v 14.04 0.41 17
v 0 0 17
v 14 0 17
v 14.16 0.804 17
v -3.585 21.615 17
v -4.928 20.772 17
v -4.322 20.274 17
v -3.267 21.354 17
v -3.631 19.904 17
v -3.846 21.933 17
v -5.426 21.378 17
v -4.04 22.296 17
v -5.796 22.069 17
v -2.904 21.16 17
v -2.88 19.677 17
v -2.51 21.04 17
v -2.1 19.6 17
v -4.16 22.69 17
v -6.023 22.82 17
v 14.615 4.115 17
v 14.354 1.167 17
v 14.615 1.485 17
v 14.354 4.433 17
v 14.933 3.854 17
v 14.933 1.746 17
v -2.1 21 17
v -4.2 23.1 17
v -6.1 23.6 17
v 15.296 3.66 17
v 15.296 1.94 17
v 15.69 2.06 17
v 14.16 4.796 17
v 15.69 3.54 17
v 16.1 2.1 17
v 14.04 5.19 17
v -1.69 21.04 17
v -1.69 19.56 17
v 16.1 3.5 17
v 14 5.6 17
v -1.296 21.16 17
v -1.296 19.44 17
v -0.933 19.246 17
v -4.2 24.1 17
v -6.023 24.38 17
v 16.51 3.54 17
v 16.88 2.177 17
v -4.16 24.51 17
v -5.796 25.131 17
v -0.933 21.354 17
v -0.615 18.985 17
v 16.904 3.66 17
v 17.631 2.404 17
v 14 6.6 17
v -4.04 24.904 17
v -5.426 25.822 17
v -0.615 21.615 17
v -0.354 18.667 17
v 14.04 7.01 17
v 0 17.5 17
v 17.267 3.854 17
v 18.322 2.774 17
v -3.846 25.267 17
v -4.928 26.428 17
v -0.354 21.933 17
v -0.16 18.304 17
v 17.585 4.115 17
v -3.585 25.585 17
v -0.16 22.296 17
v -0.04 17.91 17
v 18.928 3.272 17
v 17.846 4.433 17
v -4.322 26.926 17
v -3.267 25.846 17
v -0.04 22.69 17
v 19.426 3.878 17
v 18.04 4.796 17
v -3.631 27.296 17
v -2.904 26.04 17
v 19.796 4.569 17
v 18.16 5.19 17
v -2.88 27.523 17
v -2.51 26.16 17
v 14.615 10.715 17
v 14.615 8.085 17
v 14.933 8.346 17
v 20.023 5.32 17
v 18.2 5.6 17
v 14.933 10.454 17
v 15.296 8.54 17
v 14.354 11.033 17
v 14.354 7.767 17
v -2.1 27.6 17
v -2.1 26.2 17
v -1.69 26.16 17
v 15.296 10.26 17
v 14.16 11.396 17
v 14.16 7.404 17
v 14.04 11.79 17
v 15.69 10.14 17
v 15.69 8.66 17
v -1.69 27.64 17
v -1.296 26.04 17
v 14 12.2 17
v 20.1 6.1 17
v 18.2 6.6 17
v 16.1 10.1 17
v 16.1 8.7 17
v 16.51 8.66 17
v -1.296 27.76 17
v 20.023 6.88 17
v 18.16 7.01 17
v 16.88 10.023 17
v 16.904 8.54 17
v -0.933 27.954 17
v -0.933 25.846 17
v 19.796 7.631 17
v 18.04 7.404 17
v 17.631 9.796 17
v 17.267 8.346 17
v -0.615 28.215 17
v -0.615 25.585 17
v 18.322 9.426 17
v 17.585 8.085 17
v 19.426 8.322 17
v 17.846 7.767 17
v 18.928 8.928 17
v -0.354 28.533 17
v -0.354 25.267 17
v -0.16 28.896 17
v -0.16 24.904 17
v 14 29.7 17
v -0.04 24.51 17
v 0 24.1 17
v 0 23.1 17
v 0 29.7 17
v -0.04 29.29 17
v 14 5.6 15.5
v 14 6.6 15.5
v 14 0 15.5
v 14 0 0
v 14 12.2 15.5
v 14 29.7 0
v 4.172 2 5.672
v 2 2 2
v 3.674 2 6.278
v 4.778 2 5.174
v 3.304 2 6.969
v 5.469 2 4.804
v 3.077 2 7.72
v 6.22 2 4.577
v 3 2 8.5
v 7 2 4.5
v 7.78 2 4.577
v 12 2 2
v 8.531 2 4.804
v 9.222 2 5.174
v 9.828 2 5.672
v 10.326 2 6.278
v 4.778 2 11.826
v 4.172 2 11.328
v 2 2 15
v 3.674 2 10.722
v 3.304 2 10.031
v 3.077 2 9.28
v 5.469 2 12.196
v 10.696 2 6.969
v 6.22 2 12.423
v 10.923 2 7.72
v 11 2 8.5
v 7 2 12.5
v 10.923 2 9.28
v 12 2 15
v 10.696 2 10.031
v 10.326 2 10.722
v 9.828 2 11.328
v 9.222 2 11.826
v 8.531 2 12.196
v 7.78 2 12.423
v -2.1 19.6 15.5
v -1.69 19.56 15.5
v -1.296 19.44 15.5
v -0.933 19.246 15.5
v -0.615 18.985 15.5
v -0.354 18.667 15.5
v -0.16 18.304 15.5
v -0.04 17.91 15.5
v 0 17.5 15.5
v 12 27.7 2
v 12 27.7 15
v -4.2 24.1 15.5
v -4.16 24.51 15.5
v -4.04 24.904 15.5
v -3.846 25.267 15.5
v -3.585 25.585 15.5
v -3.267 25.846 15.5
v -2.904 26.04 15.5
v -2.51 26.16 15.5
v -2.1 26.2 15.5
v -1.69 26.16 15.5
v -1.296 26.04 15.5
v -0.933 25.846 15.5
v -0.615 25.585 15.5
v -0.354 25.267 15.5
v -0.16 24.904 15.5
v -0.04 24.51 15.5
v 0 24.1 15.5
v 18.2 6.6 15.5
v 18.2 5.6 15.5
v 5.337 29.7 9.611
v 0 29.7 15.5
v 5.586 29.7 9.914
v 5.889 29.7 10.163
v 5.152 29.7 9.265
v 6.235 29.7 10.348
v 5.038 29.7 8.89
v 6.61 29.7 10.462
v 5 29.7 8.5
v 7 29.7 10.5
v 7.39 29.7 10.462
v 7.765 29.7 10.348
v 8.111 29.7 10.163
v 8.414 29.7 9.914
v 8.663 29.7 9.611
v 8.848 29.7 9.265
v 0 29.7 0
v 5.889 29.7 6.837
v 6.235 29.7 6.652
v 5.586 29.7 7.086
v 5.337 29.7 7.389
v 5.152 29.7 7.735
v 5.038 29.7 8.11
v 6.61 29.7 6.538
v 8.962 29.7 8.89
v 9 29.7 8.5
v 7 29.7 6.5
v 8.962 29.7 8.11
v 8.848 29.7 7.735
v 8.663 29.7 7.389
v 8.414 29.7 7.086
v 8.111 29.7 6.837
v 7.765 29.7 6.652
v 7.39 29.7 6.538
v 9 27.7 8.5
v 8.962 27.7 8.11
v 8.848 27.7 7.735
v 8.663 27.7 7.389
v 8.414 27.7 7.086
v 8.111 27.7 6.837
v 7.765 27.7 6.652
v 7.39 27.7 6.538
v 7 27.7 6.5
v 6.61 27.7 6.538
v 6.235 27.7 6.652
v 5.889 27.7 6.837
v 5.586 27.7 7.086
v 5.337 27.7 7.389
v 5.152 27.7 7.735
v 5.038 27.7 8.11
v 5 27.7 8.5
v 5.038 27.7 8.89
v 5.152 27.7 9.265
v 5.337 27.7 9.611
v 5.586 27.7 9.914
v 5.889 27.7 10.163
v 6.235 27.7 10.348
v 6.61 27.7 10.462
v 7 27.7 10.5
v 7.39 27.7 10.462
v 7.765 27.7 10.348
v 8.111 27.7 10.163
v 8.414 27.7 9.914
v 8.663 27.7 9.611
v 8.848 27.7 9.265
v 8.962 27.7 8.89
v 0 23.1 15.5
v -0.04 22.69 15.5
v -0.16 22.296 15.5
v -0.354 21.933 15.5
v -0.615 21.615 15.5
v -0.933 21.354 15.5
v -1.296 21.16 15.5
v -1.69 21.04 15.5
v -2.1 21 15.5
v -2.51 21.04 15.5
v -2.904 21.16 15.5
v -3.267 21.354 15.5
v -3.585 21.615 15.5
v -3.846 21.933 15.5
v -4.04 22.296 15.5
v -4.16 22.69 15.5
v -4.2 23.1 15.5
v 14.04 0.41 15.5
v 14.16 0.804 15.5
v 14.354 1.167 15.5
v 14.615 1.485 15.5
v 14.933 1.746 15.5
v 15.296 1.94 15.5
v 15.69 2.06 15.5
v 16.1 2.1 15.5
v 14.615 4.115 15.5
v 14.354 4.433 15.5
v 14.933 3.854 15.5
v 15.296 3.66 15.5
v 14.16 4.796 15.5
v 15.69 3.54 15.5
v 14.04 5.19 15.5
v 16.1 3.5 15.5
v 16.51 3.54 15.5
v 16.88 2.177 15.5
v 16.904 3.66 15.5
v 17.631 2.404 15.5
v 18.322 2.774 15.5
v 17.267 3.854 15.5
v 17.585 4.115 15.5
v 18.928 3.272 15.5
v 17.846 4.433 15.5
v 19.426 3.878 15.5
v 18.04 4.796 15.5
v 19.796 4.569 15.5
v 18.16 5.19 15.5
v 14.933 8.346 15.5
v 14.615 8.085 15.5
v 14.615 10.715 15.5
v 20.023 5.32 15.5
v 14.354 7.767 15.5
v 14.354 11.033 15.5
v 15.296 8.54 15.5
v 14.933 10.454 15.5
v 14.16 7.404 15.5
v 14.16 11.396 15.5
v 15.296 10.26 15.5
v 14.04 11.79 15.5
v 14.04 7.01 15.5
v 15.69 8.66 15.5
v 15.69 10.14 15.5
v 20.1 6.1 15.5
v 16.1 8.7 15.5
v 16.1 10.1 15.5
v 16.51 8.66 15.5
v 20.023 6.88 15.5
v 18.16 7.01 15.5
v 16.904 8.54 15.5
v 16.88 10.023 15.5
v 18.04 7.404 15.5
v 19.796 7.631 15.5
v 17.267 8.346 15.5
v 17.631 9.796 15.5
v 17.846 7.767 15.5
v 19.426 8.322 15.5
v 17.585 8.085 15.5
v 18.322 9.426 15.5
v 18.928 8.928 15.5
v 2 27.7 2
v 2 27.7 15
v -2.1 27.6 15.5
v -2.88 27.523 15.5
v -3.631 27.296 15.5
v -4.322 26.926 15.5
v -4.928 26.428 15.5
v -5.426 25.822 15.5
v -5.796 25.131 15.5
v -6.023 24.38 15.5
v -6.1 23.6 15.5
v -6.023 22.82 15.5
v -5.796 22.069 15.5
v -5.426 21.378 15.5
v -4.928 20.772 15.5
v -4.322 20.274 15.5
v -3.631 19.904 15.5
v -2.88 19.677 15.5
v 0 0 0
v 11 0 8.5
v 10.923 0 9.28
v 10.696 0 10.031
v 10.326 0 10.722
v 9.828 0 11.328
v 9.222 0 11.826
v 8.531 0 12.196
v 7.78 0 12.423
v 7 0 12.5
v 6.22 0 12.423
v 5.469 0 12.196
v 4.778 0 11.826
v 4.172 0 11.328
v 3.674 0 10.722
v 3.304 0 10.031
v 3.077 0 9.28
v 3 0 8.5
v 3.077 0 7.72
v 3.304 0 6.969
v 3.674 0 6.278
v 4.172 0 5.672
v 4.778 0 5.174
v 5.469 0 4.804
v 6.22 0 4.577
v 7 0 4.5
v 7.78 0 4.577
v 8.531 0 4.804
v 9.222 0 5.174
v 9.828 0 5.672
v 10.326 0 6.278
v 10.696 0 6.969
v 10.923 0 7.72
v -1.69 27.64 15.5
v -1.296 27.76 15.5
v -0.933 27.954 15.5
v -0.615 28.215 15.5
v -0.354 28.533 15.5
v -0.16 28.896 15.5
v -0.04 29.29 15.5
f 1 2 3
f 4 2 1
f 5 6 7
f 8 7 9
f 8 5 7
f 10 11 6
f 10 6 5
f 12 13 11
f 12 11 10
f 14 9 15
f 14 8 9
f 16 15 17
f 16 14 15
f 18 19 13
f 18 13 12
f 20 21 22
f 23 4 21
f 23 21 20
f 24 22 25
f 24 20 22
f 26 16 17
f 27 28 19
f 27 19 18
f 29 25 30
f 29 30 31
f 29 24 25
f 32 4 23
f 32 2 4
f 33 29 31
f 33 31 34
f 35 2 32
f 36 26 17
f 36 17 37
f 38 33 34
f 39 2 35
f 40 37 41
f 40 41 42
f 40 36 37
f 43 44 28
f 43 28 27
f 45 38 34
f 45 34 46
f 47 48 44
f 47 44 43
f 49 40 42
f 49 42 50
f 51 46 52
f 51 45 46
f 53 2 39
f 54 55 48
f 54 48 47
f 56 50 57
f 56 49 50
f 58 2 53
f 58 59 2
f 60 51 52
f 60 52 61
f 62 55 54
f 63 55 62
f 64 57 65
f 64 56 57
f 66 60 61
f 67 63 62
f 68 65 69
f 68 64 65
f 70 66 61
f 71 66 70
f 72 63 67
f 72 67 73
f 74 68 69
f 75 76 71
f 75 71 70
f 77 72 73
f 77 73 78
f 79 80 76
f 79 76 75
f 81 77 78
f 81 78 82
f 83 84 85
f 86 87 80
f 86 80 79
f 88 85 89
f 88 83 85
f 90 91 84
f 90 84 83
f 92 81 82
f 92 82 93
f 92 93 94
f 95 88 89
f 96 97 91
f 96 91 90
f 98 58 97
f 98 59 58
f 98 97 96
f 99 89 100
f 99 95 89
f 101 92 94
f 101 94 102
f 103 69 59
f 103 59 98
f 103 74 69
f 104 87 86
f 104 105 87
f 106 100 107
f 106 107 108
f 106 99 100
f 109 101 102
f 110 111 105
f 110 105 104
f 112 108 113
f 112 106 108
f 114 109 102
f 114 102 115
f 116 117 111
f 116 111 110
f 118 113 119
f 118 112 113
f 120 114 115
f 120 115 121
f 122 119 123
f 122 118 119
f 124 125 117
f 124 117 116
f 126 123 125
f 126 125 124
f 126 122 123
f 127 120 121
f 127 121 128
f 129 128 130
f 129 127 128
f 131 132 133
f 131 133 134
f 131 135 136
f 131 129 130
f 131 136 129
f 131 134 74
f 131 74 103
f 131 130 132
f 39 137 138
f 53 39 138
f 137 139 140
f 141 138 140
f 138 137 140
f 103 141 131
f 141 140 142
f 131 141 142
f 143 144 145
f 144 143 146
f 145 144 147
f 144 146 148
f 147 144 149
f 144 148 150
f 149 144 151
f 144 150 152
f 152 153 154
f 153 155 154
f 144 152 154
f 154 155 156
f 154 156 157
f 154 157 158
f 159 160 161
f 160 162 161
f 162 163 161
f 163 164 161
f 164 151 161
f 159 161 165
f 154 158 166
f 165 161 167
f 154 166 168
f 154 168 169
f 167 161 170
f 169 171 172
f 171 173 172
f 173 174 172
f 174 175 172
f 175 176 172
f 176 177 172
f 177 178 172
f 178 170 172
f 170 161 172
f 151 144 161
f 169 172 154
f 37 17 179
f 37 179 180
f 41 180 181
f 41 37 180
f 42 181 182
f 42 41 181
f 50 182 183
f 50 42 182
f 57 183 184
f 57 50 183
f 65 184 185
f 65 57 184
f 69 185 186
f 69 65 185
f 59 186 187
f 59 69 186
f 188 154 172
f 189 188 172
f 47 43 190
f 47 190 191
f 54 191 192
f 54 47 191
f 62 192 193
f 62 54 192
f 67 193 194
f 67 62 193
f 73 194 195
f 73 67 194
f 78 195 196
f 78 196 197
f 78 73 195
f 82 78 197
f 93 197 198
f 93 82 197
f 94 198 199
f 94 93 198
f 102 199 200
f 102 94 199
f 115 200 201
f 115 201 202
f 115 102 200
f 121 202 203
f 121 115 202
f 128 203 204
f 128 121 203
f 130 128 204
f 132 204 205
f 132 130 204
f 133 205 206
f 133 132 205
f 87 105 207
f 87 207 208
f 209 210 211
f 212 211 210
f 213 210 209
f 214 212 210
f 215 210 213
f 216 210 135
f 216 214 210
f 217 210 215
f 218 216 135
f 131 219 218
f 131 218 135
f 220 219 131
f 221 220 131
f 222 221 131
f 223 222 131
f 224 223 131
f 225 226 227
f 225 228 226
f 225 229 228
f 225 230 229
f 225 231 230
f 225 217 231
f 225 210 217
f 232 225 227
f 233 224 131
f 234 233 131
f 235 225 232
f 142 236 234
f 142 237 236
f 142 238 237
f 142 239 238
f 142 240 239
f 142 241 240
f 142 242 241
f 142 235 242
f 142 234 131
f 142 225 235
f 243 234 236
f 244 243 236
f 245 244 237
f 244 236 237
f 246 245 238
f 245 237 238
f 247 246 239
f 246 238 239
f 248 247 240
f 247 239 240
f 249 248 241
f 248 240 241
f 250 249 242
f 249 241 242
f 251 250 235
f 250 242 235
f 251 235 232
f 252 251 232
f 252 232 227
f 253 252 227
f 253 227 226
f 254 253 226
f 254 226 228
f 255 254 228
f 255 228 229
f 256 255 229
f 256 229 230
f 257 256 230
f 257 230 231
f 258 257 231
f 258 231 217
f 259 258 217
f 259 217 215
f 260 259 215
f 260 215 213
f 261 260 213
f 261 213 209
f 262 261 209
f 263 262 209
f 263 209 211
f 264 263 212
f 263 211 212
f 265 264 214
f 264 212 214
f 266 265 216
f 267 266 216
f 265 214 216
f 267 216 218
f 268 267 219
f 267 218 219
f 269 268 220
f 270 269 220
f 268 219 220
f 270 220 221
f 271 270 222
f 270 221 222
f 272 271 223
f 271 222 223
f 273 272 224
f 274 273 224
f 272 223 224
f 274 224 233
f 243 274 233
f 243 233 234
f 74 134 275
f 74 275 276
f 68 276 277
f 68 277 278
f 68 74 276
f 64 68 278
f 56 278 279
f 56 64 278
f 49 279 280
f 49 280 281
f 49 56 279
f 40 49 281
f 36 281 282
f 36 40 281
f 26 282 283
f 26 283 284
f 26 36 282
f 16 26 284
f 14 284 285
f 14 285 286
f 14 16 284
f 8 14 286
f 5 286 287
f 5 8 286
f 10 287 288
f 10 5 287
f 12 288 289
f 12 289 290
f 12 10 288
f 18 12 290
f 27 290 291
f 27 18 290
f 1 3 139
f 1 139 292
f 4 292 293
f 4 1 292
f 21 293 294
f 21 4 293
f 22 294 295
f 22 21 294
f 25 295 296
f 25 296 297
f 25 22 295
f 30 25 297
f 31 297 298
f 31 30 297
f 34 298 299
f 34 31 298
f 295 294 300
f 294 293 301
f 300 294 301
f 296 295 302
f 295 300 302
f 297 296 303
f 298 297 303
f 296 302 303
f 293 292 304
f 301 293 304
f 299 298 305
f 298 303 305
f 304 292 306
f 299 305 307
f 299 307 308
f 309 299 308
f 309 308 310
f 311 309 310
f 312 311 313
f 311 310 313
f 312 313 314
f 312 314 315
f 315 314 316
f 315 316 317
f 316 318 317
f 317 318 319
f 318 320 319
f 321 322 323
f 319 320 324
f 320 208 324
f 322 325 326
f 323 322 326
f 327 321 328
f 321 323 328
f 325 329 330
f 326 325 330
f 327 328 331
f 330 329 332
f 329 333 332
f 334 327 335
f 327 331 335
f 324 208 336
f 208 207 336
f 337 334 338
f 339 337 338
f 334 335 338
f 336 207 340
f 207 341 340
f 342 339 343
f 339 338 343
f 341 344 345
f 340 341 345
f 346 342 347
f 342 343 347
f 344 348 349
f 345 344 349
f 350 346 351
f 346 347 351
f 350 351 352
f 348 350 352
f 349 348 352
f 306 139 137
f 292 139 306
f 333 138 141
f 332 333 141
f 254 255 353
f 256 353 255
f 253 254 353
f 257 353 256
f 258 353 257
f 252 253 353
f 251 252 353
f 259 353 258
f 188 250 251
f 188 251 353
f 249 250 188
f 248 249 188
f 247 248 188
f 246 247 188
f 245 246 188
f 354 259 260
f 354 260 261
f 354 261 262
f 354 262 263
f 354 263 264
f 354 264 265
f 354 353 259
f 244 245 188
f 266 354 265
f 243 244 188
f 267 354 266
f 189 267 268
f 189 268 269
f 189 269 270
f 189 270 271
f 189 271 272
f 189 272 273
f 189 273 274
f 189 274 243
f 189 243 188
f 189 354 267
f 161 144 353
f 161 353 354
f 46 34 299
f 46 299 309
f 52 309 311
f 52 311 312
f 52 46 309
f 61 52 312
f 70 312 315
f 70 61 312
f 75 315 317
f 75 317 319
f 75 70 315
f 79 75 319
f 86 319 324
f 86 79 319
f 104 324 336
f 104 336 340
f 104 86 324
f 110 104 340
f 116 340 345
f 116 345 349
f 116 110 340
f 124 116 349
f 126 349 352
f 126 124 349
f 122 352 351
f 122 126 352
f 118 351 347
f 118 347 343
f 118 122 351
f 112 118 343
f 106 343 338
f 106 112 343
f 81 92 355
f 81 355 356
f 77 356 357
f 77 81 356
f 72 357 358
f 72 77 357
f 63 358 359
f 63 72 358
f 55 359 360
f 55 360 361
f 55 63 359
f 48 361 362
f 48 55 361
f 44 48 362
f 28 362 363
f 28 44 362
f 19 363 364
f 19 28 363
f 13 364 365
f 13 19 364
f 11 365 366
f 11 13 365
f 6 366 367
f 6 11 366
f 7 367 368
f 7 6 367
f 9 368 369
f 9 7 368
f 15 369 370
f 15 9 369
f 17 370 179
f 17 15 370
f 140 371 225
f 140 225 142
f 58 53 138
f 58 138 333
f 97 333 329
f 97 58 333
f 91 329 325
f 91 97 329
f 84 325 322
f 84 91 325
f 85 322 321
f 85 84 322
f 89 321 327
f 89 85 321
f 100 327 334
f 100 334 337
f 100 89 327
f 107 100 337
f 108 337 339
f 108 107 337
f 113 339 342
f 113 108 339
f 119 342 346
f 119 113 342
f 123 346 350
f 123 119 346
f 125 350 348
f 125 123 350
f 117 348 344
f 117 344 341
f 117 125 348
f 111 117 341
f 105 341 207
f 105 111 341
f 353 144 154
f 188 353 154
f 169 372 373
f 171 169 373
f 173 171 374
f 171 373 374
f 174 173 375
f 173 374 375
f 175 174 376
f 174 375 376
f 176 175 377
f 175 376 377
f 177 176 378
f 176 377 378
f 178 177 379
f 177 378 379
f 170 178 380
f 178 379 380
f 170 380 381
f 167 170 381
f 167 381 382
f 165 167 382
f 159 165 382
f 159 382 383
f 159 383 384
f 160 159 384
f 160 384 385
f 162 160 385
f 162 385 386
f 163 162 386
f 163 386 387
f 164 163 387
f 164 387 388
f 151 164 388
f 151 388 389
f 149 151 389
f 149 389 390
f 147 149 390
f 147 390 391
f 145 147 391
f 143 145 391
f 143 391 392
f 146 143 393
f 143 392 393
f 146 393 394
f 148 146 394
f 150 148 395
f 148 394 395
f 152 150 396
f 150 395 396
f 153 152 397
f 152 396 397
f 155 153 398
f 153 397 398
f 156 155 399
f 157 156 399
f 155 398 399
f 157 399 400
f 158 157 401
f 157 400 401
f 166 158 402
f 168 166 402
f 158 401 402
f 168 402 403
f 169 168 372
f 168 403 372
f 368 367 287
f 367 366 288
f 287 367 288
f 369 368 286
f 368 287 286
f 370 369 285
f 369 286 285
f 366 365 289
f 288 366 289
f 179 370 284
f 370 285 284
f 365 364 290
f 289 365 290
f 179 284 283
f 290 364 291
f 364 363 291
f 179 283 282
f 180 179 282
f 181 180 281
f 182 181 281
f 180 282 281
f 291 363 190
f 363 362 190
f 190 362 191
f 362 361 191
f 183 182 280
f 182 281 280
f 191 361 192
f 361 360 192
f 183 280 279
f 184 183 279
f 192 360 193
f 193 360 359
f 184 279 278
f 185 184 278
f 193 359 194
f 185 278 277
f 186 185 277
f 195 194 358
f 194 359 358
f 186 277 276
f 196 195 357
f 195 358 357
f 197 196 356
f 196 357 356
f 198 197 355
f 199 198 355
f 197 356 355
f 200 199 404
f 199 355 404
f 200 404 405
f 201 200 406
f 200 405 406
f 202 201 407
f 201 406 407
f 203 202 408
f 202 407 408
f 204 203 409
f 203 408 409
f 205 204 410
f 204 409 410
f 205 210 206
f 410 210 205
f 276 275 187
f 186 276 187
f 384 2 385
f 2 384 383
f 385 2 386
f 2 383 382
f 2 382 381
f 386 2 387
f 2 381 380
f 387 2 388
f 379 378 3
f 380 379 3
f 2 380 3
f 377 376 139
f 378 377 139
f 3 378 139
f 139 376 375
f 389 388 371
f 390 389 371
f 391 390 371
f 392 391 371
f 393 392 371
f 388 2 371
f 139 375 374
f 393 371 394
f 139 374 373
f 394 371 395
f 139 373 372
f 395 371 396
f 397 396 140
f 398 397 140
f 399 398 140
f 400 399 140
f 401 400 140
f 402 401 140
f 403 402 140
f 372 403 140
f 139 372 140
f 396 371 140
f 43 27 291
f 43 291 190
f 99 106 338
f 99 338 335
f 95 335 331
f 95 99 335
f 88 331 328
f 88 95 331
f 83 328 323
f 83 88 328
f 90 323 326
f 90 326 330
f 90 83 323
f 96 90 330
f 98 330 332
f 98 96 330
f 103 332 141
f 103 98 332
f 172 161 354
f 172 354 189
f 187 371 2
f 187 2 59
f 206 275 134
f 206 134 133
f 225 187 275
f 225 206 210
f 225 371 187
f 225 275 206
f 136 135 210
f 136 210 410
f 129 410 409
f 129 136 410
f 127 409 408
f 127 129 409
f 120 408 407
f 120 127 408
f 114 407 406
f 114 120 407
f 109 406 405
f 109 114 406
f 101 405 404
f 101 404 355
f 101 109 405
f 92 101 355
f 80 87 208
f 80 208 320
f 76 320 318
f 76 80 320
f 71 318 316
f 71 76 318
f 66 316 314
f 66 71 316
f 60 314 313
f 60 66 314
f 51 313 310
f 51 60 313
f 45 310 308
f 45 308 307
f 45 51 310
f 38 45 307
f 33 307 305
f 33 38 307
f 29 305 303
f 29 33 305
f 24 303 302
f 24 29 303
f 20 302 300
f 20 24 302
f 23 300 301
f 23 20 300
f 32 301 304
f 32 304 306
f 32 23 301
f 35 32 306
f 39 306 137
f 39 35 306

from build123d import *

# Parameters (mm, degrees)
SKETCH1_W           = 14
SKETCH1_H           = 29.7
BOSS_EXTRUDE1_DEPTH = 17
SKETCH2_R           = 2
CUT_EXTRUDE1_DEPTH  = 30.7
SKETCH3_R           = 4
CUT_EXTRUDE2_DEPTH  = 27.7
CUT_EXTRUDE4_START  = -2
SKETCH4_W           = 10
SKETCH4_H           = 13
CUT_EXTRUDE4_DEPTH  = 25.7
BOSS_EXTRUDE2_DEPTH = 1.5


with BuildPart() as part:
    # Sketch1 → Boss-Extrude1 (new body)
    with BuildSketch(Plane.XY):
        with Locations((7, 14.85)):
            Rectangle(SKETCH1_W, SKETCH1_H)
    extrude(amount=BOSS_EXTRUDE1_DEPTH)

    # Sketch2 → Cut-Extrude1 (cut, through all)
    with BuildSketch(Plane(origin=(0, 29.7, 0), x_dir=(1, 0, 0), z_dir=(0, 1, 0))):
        with Locations((7, -8.5)):
            Circle(SKETCH2_R)
    extrude(amount=-CUT_EXTRUDE1_DEPTH, mode=Mode.SUBTRACT)

    # Sketch3 → Cut-Extrude2 (cut)
    with BuildSketch(Plane.XZ):
        with Locations((7, 8.5)):
            Circle(SKETCH3_R)
    extrude(amount=-CUT_EXTRUDE2_DEPTH, mode=Mode.SUBTRACT)

    # Sketch4 → Cut-Extrude4 (cut)
    with BuildSketch(Plane.XZ.offset(CUT_EXTRUDE4_START)):
        with Locations((7, 8.5)):
            Rectangle(SKETCH4_W, SKETCH4_H)
    extrude(amount=-CUT_EXTRUDE4_DEPTH, mode=Mode.SUBTRACT)

    # Sketch5 → Boss-Extrude2 (add)
    with BuildSketch(Plane.XY.offset(17)):
        with BuildLine():
            ThreePointArc((0, 23.1), (-2.1, 21), (-4.2, 23.1))
            Line((-4.2, 23.1), (-4.2, 24.1))
            ThreePointArc((-4.2, 24.1), (-2.1, 26.2), (0, 24.1))
            Line((0, 24.1), (0, 29.7))
            ThreePointArc((0, 29.7), (-0.61507576, 28.21507576), (-2.1, 27.6))
            ThreePointArc((-2.1, 27.6), (-6.1, 23.6), (-2.1, 19.6))
            ThreePointArc((-2.1, 19.6), (-0.61507576, 18.98492424), (0, 17.5))
            Line((0, 17.5), (0, 23.1))
        make_face()
        with BuildLine():
            Line((14, 5.6), (14, 0))
            ThreePointArc((14, 0), (14.61507576, 1.48492424), (16.1, 2.1))
            ThreePointArc((16.1, 2.1), (20.1, 6.1), (16.1, 10.1))
            ThreePointArc((16.1, 10.1), (14.61507576, 10.71507576), (14, 12.2))
            Line((14, 12.2), (14, 6.6))
            ThreePointArc((14, 6.6), (16.1, 8.7), (18.2, 6.6))
            Line((18.2, 6.6), (18.2, 5.6))
            ThreePointArc((18.2, 5.6), (16.1, 3.5), (14, 5.6))
        make_face()
    extrude(amount=-BOSS_EXTRUDE2_DEPTH)


solid = part.part
